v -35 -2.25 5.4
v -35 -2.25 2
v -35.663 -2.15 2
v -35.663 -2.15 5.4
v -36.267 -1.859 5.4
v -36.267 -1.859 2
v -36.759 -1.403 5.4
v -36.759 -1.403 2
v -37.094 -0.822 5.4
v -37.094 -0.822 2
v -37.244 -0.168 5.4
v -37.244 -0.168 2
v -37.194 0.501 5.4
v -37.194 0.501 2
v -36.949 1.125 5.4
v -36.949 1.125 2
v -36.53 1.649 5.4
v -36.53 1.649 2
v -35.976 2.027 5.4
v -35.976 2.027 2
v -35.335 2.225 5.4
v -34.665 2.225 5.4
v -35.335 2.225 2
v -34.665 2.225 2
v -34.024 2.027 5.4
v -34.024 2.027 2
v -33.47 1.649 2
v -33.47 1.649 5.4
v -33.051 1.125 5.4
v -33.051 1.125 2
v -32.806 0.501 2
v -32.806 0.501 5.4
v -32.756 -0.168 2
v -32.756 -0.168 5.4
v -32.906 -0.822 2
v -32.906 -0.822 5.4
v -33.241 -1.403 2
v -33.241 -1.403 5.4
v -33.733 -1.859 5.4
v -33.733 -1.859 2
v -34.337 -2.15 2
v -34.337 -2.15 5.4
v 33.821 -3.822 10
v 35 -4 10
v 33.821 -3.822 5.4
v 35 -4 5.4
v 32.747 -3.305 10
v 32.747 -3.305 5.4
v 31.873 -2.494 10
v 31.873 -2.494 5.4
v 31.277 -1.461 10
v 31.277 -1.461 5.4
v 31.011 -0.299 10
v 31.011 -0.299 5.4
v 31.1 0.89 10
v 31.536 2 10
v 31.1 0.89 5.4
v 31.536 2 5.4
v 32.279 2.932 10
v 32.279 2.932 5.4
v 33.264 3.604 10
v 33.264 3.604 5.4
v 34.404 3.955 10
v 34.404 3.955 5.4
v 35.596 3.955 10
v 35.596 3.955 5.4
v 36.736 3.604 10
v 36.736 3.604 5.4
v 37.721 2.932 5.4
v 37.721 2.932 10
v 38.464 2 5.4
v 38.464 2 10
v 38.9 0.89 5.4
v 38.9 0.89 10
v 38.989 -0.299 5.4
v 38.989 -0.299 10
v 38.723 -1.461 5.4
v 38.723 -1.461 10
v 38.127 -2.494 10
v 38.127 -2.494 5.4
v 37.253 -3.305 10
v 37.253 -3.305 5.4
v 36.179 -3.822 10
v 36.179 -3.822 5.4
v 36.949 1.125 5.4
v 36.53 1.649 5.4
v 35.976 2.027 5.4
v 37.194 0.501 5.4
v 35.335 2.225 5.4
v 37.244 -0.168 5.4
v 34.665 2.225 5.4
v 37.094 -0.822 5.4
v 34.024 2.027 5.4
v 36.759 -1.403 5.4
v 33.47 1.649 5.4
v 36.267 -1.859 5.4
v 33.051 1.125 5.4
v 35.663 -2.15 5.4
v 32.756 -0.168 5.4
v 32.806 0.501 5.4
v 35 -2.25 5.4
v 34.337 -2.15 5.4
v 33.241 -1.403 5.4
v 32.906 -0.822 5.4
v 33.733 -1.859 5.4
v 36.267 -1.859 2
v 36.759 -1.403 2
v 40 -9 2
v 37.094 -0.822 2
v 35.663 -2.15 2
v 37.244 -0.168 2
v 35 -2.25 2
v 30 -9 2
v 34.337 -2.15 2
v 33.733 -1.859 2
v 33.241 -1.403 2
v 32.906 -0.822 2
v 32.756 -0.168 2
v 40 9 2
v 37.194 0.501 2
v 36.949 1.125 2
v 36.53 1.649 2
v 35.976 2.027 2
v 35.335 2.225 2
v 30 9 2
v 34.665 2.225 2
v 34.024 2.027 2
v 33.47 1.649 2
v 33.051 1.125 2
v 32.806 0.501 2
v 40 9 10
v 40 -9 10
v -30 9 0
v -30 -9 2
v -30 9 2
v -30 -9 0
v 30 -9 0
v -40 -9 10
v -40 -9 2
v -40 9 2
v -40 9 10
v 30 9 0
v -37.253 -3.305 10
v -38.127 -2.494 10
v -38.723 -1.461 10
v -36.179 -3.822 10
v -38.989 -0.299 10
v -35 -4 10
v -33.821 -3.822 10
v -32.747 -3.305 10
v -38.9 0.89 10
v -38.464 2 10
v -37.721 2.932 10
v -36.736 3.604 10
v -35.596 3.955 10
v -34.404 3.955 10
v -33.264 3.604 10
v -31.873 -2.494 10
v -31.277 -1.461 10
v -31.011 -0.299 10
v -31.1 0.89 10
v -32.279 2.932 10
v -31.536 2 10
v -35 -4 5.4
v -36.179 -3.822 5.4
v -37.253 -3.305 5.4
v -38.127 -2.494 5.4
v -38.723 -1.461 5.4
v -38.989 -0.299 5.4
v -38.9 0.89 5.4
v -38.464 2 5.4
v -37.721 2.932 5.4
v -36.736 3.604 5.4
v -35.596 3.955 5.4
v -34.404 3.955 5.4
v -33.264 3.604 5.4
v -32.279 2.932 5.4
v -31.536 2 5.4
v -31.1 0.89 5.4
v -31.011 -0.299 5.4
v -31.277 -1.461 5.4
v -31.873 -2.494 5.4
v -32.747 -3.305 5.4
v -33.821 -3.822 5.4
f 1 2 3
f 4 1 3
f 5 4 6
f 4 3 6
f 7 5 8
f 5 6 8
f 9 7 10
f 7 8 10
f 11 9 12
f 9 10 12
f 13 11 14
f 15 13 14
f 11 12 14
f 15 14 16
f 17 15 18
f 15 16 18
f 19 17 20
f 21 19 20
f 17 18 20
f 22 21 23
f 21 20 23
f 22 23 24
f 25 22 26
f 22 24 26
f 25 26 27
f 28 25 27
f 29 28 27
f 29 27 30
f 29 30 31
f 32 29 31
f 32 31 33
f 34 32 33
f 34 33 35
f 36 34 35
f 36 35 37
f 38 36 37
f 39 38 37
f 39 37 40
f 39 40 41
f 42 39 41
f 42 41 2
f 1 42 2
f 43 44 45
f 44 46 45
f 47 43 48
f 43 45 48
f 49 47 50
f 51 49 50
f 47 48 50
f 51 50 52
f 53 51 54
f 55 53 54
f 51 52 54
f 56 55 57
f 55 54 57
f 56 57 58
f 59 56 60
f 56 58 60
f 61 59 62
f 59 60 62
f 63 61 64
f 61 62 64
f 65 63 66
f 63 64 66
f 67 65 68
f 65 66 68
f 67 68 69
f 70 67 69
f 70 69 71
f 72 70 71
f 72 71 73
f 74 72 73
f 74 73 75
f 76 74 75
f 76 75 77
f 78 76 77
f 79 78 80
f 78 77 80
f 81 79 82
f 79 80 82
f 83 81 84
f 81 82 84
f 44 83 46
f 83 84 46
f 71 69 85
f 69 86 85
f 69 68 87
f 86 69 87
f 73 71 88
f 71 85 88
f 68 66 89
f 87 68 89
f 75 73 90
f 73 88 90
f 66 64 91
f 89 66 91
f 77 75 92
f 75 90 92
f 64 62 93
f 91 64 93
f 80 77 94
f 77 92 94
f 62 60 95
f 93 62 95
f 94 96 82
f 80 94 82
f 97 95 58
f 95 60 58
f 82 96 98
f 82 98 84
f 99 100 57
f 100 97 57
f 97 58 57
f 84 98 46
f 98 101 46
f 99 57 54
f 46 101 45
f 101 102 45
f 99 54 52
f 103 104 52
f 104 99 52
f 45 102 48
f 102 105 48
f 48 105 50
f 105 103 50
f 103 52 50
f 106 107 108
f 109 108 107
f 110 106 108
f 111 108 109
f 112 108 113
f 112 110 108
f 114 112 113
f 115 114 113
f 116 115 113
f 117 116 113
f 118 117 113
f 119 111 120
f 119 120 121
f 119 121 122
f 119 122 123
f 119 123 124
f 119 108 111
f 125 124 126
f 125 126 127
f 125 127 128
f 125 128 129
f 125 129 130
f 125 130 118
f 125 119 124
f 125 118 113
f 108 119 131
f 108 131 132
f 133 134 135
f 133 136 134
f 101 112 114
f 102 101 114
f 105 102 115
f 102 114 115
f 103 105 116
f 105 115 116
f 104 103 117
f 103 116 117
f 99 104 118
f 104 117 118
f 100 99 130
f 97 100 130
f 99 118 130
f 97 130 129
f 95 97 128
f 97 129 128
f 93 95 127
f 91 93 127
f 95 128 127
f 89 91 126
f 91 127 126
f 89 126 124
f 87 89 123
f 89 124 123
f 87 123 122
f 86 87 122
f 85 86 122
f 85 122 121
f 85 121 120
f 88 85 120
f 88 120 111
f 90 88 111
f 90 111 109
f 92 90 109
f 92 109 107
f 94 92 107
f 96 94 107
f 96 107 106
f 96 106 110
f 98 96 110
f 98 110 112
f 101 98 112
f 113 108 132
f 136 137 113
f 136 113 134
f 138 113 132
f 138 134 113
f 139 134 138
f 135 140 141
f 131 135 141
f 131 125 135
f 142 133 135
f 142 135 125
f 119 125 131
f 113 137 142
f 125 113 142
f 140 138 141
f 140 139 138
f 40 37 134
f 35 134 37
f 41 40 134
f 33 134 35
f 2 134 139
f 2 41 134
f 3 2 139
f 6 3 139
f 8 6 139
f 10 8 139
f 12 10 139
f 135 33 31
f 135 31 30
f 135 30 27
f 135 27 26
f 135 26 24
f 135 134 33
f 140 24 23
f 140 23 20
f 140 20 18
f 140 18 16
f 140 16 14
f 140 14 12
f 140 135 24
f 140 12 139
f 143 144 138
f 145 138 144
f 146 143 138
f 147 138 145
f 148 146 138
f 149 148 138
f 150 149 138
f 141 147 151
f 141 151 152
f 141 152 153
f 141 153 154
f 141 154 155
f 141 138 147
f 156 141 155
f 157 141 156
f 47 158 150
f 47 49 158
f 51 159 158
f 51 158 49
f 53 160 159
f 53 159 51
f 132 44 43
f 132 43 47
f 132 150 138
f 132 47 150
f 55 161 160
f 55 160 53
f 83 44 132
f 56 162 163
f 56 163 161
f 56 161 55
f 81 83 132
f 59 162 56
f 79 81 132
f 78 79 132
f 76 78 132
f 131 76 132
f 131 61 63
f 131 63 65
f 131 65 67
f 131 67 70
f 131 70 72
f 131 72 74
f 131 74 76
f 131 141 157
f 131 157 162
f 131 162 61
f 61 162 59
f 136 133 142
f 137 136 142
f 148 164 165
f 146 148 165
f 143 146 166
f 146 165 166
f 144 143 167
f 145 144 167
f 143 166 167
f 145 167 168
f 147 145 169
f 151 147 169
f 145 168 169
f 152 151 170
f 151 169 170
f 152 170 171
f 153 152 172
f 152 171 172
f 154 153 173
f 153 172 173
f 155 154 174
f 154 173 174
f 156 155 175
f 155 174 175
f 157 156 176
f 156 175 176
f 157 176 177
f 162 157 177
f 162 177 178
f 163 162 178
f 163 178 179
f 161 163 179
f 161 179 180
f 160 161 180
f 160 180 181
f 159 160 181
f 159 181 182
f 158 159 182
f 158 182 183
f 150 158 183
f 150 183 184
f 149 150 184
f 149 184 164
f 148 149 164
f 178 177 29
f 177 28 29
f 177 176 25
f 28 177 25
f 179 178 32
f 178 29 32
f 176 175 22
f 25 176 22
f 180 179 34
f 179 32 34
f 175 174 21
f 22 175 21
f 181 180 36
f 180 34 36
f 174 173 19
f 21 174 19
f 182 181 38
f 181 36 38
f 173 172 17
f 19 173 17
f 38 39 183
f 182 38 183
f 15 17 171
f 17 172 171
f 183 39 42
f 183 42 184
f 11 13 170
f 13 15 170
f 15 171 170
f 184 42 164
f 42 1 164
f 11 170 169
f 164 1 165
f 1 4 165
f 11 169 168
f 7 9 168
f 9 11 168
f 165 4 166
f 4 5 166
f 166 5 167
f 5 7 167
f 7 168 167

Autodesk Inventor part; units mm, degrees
ref_plane "YZ Plane" through (0, 0, 0) normal (1, 0, 0) x (0, 1, 0)
ref_plane "XZ Plane" through (0, 0, 0) normal (0, 1, 0) x (-1, 0, 0)
ref_plane "XY Plane" through (0, 0, 0) normal (0, 0, 1) x (1, 0, 0)
sketch "Skizze_Grudnkörper" plane through (0, 0, 0) normal (0, 0, 1) x (1, 0, 0)
  line L0 (-56, 0) -> (56, 0) projected
  line L1 (0, -12.6) -> (0, 12.6) projected
  line L2 (40, -9) -> (-40, -9)
  line L3 (-40, -9) -> (-40, 9)
  line L4 (-40, 9) -> (40, 9)
  line L5 (40, 9) -> (40, -9)
  line L6 (40, -9) -> (-40, 9) construction
  line L7 (-40, -9) -> (40, 9) construction
  point P0 (0, 0)
  dimension "Länge" = 80
  dimension "Breite" = 18
extrude "Grundkörper" add sketch "Skizze_Grudnkörper" along normal blind 10
sketch "Skizze_Senkbohrung" plane through (0, 0, 10) normal (0, 0, 1) x (1, 0, 0)
  line L0 (-56, 0) -> (56, 0) projected
  line L1 (0, -12.6) -> (0, 12.6) projected
  line L2 (-40, -9) -> (40, -9) projected
  line L3 (40, -9) -> (40, 9) projected
  line L4 (40, 9) -> (-40, 9) projected
  line L5 (-40, 9) -> (-40, -9) projected
  point P0 (0, 0)
  point P1 (-35, 0)
  point P2 (35, 0)
  dimension "d4" = 70
hole "Senkbohrung" at (-35, 0, 10) at (35, 0, 10) direction (0, 0, -1) diameter 4.5 end through all counterbore diameter 8 counterbore depth 4.6
sketch "Skizze_Ausnehmung" plane through (0, 0, 0) normal (0, 0, -1) x (-1, 0, 0)
  circle A0 centre (35, 0) radius 2.25 projected
  circle A1 centre (-35, 0) radius 2.25 projected
  line L0 (-40, -9) -> (40, -9) projected
  line L1 (40, -9) -> (40, 9) projected
  line L2 (40, 9) -> (-40, 9) projected
  line L3 (-40, 9) -> (-40, -9) projected
  line L4 (56, 0) -> (-56, 0) projected
  line L5 (0, -12.6) -> (0, 12.6) projected
  line L6 (40, 9) -> (-40, 9) projected
  line L7 (40, -9) -> (30, -9)
  line L8 (30, -9) -> (30, 9)
  line L9 (30, 9) -> (40, 9)
  line L10 (40, 9) -> (40, -9)
  line L11 (-40, 9) -> (-40, -9) projected
  line L12 (-40, -9) -> (-30, -9)
  line L13 (-30, -9) -> (-30, 9)
  line L14 (-30, 9) -> (-40, 9)
  line L15 (-40, 9) -> (-40, -9)
  point P0 (0, 0)
  dimension "d12" = 60
extrude "Ausnehmung" cut sketch "Skizze_Ausnehmung" against normal blind 2 contours L4 L1 L0 L8 A0 | A0 L4 L8 L2 L1 | L13 L0 L3 L4 A1 | L4 A1 L3 L2 L13
properties material "Stahl, unlegiert"
